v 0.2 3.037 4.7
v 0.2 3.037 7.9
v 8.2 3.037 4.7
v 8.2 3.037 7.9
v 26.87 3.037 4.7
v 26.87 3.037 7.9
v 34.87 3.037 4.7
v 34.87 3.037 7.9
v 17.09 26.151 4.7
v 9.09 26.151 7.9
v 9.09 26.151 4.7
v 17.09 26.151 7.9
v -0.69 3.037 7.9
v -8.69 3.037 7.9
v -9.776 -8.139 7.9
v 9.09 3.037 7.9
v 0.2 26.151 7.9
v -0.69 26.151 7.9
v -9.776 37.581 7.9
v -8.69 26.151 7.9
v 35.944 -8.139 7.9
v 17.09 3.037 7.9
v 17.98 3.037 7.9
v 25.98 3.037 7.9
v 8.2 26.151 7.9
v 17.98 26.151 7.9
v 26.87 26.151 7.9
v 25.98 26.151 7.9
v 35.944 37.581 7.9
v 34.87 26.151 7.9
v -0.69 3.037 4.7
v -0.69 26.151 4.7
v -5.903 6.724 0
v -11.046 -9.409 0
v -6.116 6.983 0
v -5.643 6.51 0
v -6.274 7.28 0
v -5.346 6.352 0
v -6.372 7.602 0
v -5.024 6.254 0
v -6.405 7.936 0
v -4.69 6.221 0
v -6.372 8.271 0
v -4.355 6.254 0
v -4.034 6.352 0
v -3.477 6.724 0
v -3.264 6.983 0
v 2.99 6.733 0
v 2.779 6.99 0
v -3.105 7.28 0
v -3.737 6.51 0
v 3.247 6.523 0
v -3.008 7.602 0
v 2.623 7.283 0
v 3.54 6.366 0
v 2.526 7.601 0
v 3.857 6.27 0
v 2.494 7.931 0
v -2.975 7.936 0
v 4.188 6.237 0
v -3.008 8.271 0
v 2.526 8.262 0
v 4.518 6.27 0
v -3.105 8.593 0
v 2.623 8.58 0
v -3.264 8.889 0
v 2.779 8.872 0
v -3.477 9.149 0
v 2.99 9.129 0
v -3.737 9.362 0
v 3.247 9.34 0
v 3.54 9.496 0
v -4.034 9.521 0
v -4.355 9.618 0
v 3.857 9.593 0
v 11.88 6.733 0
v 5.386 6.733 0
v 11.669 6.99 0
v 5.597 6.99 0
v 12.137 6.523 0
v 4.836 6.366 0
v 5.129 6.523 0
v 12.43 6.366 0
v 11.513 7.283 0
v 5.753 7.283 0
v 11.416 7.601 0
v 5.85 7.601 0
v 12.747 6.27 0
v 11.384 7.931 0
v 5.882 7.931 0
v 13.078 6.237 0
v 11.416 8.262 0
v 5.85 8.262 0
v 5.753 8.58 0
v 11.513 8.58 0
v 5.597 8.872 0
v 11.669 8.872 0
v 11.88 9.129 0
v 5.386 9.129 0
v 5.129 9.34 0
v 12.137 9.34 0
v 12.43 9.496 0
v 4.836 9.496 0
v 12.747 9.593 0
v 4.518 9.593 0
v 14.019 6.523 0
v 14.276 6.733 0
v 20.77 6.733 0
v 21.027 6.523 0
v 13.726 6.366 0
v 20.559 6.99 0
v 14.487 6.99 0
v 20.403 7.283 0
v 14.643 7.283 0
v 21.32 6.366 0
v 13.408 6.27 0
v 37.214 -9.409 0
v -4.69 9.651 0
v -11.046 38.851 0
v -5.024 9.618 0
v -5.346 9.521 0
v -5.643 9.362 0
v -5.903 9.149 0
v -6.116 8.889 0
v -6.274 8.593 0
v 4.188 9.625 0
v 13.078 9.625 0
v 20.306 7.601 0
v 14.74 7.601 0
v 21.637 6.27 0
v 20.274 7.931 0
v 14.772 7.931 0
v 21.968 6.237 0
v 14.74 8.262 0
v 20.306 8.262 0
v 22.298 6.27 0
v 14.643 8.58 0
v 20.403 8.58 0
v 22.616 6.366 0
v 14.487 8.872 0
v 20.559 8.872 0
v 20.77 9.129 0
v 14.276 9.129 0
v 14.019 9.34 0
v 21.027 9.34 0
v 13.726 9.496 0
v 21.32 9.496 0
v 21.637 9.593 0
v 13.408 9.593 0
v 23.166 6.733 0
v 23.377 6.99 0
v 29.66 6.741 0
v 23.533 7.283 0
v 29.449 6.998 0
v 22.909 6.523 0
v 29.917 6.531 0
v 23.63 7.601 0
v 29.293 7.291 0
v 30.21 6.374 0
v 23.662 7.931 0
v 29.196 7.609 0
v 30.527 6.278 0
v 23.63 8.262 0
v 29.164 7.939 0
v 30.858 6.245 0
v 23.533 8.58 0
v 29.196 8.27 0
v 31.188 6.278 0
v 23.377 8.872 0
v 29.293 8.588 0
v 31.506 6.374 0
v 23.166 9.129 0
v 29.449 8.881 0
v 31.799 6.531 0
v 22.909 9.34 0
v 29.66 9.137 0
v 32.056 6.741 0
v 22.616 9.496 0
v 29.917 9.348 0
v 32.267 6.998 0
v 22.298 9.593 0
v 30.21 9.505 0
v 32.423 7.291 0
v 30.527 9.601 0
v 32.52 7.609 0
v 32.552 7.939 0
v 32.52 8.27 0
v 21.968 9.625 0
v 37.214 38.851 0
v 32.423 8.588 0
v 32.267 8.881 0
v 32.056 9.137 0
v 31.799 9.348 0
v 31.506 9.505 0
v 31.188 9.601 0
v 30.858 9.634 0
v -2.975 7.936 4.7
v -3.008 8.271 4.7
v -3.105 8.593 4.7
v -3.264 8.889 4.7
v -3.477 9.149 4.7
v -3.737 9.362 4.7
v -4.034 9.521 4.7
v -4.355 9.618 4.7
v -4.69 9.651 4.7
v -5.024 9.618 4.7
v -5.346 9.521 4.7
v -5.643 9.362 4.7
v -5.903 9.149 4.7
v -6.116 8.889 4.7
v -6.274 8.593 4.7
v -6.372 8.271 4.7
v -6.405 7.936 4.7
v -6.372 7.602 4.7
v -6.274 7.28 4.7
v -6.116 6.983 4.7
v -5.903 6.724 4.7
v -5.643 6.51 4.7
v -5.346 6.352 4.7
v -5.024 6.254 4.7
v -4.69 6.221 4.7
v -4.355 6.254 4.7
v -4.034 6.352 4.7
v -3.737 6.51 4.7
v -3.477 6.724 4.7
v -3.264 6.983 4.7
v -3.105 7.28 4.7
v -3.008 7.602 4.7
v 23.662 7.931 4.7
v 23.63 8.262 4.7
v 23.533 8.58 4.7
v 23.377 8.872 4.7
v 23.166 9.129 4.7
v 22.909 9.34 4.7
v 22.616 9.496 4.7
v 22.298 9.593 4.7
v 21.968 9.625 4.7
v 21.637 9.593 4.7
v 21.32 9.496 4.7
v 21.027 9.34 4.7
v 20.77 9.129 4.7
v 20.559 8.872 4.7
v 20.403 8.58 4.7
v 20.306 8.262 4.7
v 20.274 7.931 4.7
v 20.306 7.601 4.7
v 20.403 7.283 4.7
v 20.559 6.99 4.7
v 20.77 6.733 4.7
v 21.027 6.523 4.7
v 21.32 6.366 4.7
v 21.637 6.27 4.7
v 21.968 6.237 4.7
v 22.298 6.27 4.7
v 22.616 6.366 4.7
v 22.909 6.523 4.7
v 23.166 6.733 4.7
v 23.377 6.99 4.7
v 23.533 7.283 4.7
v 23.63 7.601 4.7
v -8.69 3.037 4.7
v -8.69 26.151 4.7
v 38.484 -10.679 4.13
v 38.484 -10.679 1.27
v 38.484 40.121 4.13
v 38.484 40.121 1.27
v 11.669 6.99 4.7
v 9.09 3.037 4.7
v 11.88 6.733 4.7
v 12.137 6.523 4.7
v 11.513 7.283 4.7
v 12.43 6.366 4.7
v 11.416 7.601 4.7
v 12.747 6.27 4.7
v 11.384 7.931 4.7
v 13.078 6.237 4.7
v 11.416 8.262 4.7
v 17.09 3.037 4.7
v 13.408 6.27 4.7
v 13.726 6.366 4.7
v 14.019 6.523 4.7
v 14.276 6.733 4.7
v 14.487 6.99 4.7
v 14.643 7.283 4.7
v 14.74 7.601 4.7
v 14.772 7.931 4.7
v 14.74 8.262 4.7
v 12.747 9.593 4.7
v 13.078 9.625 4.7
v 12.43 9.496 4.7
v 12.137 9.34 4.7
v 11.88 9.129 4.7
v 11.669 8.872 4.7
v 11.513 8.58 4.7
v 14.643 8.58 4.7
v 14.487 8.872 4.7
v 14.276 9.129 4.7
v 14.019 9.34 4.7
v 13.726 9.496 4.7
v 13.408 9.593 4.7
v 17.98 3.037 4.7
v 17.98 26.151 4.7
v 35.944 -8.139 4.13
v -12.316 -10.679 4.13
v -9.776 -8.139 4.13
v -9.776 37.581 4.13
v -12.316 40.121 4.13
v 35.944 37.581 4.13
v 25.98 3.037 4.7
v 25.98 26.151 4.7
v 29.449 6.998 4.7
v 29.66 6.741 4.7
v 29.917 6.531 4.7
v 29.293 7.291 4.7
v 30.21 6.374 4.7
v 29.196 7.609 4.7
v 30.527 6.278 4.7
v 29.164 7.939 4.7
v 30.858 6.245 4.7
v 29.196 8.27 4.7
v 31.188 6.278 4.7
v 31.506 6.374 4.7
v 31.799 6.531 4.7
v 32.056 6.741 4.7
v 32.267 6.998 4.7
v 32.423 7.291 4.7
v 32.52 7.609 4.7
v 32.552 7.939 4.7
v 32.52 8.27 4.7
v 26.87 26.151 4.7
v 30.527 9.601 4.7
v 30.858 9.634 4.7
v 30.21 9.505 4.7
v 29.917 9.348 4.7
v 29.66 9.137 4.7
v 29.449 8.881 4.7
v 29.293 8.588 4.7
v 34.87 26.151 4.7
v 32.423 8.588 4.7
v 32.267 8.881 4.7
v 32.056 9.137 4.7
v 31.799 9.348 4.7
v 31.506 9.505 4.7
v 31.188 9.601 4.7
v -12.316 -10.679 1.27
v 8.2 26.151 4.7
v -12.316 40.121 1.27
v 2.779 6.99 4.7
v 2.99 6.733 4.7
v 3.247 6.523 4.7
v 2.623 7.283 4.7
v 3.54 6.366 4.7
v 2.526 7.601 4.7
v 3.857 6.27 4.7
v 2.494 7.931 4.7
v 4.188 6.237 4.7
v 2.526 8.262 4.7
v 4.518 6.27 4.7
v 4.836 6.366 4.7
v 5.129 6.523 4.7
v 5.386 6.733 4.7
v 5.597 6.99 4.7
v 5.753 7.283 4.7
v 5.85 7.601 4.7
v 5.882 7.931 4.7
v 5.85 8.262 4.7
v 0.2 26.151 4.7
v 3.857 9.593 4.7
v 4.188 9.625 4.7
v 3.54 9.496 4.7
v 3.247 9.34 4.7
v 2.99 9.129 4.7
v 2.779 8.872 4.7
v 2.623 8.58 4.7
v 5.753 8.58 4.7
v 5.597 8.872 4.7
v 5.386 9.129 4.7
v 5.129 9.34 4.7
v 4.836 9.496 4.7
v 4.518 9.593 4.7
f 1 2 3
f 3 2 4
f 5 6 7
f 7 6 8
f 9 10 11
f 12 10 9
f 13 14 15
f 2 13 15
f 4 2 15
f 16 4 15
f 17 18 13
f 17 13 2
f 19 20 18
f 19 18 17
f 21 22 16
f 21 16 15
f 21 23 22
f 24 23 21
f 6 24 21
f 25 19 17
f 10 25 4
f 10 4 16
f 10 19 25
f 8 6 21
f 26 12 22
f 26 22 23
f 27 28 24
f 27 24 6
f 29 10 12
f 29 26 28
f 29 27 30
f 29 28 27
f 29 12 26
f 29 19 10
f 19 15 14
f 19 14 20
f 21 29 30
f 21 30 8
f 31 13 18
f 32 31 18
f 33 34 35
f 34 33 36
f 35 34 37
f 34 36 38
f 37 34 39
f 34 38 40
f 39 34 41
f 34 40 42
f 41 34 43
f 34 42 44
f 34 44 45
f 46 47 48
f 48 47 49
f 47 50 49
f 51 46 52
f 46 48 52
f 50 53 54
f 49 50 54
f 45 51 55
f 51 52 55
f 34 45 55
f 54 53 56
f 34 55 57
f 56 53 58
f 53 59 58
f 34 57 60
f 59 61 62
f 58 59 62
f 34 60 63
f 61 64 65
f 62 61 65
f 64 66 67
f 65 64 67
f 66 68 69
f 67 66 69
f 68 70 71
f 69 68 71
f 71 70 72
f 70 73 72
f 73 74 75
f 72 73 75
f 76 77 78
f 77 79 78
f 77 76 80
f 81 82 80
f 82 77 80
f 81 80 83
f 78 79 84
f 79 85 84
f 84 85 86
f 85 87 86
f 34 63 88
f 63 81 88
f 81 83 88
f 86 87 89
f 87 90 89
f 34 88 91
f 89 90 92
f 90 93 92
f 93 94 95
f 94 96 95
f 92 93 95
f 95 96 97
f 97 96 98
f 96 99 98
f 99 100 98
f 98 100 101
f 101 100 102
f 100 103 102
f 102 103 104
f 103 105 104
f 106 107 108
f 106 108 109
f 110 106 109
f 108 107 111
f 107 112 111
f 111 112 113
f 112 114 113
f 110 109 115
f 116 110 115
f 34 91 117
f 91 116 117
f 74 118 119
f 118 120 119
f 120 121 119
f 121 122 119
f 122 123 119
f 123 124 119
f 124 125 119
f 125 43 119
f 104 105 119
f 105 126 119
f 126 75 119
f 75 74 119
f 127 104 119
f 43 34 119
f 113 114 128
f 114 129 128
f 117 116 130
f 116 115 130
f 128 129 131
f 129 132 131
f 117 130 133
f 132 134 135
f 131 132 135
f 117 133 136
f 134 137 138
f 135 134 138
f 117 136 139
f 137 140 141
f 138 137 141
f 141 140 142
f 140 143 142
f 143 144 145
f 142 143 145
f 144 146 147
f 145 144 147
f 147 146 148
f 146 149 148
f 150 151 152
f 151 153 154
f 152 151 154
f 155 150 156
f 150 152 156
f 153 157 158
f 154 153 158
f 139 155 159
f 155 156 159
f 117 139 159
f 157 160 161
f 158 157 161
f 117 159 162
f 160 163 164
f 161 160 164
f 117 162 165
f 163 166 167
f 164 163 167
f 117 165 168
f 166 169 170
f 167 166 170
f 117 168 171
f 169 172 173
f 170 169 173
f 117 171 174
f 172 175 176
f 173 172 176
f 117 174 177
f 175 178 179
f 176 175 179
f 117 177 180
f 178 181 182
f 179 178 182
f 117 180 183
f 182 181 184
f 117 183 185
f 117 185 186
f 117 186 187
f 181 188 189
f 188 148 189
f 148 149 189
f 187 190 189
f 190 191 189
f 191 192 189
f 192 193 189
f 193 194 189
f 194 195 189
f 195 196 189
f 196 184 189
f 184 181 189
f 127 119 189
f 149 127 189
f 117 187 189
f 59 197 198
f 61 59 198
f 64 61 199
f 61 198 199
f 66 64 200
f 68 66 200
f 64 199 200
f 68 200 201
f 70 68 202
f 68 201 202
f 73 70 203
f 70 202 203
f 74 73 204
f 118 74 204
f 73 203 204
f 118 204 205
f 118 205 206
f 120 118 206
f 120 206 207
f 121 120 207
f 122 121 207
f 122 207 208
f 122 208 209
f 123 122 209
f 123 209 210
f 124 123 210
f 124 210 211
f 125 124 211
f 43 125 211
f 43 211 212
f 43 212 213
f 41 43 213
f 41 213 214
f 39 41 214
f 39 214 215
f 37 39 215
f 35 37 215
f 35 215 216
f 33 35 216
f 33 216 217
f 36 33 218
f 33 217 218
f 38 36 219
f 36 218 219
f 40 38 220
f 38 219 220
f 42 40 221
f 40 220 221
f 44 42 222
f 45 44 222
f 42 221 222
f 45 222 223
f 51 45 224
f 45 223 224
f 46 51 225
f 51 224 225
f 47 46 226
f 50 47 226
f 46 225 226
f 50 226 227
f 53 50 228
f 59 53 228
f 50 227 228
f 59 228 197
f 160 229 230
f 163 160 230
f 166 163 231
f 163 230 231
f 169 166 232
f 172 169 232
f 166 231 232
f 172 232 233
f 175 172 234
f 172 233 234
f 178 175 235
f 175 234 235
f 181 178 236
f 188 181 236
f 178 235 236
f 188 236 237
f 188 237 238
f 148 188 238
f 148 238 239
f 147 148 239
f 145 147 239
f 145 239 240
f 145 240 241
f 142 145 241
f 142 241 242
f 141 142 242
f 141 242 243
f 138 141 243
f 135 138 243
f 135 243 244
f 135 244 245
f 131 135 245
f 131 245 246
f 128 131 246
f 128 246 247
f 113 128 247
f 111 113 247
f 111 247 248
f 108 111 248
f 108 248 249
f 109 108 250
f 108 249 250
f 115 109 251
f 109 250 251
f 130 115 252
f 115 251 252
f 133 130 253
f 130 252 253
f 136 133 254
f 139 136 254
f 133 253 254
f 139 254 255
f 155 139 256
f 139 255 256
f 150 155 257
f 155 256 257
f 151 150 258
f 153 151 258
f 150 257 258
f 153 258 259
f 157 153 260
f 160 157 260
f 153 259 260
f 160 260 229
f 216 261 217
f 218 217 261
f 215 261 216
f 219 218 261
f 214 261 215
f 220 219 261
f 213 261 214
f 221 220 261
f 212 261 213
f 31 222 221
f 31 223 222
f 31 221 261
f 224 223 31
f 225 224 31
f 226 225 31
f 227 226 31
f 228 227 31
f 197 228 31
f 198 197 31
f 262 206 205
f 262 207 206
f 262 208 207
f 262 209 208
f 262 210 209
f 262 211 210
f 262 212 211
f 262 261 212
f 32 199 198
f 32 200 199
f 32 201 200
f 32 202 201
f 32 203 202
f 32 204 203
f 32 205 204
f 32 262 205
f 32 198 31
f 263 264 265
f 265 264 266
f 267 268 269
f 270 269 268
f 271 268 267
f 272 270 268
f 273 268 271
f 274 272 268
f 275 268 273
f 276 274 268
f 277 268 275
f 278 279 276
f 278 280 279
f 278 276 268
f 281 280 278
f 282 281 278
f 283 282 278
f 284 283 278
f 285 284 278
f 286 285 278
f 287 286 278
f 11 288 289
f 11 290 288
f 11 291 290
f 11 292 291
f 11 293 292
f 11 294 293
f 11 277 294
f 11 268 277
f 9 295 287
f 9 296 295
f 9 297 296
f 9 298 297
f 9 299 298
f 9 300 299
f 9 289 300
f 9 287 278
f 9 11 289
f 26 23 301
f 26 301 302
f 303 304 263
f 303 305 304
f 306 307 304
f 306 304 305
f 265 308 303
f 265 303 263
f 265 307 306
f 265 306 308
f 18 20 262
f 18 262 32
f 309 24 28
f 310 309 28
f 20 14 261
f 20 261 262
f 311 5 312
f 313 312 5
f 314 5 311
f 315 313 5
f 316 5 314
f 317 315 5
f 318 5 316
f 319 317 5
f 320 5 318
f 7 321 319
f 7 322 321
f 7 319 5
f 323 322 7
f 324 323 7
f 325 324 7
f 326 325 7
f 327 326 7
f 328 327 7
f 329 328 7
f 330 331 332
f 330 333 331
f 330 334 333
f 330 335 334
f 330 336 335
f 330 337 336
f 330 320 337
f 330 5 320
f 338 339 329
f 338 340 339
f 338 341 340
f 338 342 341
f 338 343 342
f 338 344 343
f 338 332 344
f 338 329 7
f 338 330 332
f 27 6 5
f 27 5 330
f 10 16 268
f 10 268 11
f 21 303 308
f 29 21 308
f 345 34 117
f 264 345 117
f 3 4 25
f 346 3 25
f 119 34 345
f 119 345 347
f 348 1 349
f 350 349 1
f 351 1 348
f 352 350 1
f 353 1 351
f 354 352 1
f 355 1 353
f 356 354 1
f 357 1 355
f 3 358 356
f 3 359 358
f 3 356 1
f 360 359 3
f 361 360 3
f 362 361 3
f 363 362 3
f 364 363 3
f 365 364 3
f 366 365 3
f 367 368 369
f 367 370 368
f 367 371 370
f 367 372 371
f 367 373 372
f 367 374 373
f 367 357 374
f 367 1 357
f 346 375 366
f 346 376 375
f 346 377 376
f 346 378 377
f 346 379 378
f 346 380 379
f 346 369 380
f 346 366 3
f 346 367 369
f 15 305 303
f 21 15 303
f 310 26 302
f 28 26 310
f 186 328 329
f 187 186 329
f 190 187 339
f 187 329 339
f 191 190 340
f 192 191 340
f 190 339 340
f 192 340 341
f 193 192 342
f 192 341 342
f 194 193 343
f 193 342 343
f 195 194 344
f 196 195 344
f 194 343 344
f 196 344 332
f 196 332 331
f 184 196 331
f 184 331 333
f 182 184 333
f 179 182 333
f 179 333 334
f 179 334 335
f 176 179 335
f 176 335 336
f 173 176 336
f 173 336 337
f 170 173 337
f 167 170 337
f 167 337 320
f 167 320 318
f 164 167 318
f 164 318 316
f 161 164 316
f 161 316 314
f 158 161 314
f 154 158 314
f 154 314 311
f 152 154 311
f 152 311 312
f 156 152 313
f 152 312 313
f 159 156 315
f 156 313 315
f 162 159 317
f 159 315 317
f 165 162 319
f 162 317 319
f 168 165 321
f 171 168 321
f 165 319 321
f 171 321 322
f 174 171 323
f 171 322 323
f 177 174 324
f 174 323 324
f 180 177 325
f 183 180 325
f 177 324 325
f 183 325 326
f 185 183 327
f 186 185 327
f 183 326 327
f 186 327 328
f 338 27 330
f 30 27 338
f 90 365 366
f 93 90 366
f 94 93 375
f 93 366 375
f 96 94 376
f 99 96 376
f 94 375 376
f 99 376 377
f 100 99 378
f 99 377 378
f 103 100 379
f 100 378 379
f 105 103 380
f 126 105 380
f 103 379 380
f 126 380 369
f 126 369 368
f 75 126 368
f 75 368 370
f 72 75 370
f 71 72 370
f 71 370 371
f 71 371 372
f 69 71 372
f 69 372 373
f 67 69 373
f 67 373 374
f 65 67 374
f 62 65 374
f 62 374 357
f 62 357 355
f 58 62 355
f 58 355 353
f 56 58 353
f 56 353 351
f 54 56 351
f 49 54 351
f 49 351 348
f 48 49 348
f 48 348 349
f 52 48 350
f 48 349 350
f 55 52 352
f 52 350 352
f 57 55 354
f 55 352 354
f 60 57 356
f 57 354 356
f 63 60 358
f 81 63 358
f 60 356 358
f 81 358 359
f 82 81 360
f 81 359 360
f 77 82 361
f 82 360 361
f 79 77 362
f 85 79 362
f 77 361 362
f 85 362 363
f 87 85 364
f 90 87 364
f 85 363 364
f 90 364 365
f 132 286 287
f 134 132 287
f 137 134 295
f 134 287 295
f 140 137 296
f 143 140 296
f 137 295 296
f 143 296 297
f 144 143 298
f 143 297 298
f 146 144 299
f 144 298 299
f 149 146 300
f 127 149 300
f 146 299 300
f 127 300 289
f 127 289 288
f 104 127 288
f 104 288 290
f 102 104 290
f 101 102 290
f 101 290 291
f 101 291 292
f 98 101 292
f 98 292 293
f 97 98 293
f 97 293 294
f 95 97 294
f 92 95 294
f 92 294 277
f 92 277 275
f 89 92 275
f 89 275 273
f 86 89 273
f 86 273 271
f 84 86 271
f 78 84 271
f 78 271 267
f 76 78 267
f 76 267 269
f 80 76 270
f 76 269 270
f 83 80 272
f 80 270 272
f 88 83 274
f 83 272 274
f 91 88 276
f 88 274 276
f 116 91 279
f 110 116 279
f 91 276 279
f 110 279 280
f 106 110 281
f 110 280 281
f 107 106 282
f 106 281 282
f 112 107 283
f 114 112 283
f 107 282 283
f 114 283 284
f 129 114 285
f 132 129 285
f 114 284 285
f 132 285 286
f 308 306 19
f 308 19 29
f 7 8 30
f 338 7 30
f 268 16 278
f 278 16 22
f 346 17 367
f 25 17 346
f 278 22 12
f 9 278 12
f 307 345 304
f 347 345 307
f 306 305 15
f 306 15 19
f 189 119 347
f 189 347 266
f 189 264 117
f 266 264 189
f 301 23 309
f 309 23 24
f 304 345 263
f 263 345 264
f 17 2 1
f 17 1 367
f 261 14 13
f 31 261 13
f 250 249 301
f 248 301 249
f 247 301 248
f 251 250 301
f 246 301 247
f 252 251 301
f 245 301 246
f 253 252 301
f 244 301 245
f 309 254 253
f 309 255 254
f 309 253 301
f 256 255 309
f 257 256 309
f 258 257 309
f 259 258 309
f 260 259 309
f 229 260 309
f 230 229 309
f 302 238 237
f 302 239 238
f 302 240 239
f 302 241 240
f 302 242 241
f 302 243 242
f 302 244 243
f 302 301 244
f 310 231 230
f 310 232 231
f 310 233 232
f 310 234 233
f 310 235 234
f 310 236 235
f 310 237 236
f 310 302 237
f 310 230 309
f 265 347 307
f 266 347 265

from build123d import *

# Parameters (mm, degrees)
F0_W      = 50.8
F0_H      = 50.8
F1_DEPTH  = 4.13
F3_W      = 45.72
F3_H      = 45.72
F4_DEPTH  = 3.77
F5_W      = 8
F5_H      = 23.114
F6_DEPTH  = 3.2
F7_R      = 1.715
F8_DEPTH  = 25.4
F9_SIZE   = 1.27
F10_R     = 1.694213851
F11_DEPTH = 25.4


# Not quite as in the source:
# - a feature names something its author has since deleted; it is built from what else it names


with BuildPart() as f1:
    # F0 (on Top) → F1 (new body)
    with BuildSketch(Plane.XY):
        with Locations((13.0843408406, 14.7212249442)):
            Rectangle(F0_W, F0_H)
    extrude(amount=F1_DEPTH)

    # F3 (on face) → F4 (join)
    with BuildSketch(Plane.XY.offset(4.13)):
        with Locations((13.0843408406, 14.7212249442)):
            Rectangle(F3_W, F3_H)
    extrude(amount=F4_DEPTH)

    # F5 (on face) → F6 (cut)
    with BuildSketch(Plane.XY.offset(7.9)):
        with Locations((4.2001288666, 14.5942249442)):
            Rectangle(F5_W, F5_H)
        with Locations((13.0901288666, 14.5942249442)):
            Rectangle(F5_W, F5_H)
        with Locations((21.9801288666, 14.5942249442)):
            Rectangle(F5_W, F5_H)
        with Locations((30.8701288666, 14.5942249442)):
            Rectangle(F5_W, F5_H)
        with Locations((-4.6898711334, 14.5942249442)):
            Rectangle(F5_W, F5_H)
    extrude(amount=-F6_DEPTH, mode=Mode.SUBTRACT)

    # F7 (on face) → F8 (cut)
    with BuildSketch(Plane.XY.offset(4.7)):
        with Locations((-4.6898711334, 7.9362249442)):
            Circle(F7_R)
    extrude(amount=-F8_DEPTH, mode=Mode.SUBTRACT)

    # F9
    f9_edges = [f1.edges().sort_by_distance(p)[0] for p in [
        (13.084341, -10.678775, 0),
        (13.084341, 40.121225, 0),
        (-12.315659, 14.721225, 0),
        (38.484341, 14.721225, 0),
    ]]
    chamfer(f9_edges, length=F9_SIZE)

    # F10 (on face) → F11 (cut)
    with BuildSketch(Plane.XY.offset(4.7)):
        with Locations((4.1879288666, 7.9312249442)):
            Circle(F10_R)
        with Locations((13.0779288666, 7.9312249442)):
            Circle(F10_R)
        with Locations((21.9679288666, 7.9312249442)):
            Circle(F10_R)
        with Locations((30.8579288666, 7.9394249442)):
            Circle(F10_R)
    extrude(amount=-F11_DEPTH, mode=Mode.SUBTRACT)


solid = f1.part
